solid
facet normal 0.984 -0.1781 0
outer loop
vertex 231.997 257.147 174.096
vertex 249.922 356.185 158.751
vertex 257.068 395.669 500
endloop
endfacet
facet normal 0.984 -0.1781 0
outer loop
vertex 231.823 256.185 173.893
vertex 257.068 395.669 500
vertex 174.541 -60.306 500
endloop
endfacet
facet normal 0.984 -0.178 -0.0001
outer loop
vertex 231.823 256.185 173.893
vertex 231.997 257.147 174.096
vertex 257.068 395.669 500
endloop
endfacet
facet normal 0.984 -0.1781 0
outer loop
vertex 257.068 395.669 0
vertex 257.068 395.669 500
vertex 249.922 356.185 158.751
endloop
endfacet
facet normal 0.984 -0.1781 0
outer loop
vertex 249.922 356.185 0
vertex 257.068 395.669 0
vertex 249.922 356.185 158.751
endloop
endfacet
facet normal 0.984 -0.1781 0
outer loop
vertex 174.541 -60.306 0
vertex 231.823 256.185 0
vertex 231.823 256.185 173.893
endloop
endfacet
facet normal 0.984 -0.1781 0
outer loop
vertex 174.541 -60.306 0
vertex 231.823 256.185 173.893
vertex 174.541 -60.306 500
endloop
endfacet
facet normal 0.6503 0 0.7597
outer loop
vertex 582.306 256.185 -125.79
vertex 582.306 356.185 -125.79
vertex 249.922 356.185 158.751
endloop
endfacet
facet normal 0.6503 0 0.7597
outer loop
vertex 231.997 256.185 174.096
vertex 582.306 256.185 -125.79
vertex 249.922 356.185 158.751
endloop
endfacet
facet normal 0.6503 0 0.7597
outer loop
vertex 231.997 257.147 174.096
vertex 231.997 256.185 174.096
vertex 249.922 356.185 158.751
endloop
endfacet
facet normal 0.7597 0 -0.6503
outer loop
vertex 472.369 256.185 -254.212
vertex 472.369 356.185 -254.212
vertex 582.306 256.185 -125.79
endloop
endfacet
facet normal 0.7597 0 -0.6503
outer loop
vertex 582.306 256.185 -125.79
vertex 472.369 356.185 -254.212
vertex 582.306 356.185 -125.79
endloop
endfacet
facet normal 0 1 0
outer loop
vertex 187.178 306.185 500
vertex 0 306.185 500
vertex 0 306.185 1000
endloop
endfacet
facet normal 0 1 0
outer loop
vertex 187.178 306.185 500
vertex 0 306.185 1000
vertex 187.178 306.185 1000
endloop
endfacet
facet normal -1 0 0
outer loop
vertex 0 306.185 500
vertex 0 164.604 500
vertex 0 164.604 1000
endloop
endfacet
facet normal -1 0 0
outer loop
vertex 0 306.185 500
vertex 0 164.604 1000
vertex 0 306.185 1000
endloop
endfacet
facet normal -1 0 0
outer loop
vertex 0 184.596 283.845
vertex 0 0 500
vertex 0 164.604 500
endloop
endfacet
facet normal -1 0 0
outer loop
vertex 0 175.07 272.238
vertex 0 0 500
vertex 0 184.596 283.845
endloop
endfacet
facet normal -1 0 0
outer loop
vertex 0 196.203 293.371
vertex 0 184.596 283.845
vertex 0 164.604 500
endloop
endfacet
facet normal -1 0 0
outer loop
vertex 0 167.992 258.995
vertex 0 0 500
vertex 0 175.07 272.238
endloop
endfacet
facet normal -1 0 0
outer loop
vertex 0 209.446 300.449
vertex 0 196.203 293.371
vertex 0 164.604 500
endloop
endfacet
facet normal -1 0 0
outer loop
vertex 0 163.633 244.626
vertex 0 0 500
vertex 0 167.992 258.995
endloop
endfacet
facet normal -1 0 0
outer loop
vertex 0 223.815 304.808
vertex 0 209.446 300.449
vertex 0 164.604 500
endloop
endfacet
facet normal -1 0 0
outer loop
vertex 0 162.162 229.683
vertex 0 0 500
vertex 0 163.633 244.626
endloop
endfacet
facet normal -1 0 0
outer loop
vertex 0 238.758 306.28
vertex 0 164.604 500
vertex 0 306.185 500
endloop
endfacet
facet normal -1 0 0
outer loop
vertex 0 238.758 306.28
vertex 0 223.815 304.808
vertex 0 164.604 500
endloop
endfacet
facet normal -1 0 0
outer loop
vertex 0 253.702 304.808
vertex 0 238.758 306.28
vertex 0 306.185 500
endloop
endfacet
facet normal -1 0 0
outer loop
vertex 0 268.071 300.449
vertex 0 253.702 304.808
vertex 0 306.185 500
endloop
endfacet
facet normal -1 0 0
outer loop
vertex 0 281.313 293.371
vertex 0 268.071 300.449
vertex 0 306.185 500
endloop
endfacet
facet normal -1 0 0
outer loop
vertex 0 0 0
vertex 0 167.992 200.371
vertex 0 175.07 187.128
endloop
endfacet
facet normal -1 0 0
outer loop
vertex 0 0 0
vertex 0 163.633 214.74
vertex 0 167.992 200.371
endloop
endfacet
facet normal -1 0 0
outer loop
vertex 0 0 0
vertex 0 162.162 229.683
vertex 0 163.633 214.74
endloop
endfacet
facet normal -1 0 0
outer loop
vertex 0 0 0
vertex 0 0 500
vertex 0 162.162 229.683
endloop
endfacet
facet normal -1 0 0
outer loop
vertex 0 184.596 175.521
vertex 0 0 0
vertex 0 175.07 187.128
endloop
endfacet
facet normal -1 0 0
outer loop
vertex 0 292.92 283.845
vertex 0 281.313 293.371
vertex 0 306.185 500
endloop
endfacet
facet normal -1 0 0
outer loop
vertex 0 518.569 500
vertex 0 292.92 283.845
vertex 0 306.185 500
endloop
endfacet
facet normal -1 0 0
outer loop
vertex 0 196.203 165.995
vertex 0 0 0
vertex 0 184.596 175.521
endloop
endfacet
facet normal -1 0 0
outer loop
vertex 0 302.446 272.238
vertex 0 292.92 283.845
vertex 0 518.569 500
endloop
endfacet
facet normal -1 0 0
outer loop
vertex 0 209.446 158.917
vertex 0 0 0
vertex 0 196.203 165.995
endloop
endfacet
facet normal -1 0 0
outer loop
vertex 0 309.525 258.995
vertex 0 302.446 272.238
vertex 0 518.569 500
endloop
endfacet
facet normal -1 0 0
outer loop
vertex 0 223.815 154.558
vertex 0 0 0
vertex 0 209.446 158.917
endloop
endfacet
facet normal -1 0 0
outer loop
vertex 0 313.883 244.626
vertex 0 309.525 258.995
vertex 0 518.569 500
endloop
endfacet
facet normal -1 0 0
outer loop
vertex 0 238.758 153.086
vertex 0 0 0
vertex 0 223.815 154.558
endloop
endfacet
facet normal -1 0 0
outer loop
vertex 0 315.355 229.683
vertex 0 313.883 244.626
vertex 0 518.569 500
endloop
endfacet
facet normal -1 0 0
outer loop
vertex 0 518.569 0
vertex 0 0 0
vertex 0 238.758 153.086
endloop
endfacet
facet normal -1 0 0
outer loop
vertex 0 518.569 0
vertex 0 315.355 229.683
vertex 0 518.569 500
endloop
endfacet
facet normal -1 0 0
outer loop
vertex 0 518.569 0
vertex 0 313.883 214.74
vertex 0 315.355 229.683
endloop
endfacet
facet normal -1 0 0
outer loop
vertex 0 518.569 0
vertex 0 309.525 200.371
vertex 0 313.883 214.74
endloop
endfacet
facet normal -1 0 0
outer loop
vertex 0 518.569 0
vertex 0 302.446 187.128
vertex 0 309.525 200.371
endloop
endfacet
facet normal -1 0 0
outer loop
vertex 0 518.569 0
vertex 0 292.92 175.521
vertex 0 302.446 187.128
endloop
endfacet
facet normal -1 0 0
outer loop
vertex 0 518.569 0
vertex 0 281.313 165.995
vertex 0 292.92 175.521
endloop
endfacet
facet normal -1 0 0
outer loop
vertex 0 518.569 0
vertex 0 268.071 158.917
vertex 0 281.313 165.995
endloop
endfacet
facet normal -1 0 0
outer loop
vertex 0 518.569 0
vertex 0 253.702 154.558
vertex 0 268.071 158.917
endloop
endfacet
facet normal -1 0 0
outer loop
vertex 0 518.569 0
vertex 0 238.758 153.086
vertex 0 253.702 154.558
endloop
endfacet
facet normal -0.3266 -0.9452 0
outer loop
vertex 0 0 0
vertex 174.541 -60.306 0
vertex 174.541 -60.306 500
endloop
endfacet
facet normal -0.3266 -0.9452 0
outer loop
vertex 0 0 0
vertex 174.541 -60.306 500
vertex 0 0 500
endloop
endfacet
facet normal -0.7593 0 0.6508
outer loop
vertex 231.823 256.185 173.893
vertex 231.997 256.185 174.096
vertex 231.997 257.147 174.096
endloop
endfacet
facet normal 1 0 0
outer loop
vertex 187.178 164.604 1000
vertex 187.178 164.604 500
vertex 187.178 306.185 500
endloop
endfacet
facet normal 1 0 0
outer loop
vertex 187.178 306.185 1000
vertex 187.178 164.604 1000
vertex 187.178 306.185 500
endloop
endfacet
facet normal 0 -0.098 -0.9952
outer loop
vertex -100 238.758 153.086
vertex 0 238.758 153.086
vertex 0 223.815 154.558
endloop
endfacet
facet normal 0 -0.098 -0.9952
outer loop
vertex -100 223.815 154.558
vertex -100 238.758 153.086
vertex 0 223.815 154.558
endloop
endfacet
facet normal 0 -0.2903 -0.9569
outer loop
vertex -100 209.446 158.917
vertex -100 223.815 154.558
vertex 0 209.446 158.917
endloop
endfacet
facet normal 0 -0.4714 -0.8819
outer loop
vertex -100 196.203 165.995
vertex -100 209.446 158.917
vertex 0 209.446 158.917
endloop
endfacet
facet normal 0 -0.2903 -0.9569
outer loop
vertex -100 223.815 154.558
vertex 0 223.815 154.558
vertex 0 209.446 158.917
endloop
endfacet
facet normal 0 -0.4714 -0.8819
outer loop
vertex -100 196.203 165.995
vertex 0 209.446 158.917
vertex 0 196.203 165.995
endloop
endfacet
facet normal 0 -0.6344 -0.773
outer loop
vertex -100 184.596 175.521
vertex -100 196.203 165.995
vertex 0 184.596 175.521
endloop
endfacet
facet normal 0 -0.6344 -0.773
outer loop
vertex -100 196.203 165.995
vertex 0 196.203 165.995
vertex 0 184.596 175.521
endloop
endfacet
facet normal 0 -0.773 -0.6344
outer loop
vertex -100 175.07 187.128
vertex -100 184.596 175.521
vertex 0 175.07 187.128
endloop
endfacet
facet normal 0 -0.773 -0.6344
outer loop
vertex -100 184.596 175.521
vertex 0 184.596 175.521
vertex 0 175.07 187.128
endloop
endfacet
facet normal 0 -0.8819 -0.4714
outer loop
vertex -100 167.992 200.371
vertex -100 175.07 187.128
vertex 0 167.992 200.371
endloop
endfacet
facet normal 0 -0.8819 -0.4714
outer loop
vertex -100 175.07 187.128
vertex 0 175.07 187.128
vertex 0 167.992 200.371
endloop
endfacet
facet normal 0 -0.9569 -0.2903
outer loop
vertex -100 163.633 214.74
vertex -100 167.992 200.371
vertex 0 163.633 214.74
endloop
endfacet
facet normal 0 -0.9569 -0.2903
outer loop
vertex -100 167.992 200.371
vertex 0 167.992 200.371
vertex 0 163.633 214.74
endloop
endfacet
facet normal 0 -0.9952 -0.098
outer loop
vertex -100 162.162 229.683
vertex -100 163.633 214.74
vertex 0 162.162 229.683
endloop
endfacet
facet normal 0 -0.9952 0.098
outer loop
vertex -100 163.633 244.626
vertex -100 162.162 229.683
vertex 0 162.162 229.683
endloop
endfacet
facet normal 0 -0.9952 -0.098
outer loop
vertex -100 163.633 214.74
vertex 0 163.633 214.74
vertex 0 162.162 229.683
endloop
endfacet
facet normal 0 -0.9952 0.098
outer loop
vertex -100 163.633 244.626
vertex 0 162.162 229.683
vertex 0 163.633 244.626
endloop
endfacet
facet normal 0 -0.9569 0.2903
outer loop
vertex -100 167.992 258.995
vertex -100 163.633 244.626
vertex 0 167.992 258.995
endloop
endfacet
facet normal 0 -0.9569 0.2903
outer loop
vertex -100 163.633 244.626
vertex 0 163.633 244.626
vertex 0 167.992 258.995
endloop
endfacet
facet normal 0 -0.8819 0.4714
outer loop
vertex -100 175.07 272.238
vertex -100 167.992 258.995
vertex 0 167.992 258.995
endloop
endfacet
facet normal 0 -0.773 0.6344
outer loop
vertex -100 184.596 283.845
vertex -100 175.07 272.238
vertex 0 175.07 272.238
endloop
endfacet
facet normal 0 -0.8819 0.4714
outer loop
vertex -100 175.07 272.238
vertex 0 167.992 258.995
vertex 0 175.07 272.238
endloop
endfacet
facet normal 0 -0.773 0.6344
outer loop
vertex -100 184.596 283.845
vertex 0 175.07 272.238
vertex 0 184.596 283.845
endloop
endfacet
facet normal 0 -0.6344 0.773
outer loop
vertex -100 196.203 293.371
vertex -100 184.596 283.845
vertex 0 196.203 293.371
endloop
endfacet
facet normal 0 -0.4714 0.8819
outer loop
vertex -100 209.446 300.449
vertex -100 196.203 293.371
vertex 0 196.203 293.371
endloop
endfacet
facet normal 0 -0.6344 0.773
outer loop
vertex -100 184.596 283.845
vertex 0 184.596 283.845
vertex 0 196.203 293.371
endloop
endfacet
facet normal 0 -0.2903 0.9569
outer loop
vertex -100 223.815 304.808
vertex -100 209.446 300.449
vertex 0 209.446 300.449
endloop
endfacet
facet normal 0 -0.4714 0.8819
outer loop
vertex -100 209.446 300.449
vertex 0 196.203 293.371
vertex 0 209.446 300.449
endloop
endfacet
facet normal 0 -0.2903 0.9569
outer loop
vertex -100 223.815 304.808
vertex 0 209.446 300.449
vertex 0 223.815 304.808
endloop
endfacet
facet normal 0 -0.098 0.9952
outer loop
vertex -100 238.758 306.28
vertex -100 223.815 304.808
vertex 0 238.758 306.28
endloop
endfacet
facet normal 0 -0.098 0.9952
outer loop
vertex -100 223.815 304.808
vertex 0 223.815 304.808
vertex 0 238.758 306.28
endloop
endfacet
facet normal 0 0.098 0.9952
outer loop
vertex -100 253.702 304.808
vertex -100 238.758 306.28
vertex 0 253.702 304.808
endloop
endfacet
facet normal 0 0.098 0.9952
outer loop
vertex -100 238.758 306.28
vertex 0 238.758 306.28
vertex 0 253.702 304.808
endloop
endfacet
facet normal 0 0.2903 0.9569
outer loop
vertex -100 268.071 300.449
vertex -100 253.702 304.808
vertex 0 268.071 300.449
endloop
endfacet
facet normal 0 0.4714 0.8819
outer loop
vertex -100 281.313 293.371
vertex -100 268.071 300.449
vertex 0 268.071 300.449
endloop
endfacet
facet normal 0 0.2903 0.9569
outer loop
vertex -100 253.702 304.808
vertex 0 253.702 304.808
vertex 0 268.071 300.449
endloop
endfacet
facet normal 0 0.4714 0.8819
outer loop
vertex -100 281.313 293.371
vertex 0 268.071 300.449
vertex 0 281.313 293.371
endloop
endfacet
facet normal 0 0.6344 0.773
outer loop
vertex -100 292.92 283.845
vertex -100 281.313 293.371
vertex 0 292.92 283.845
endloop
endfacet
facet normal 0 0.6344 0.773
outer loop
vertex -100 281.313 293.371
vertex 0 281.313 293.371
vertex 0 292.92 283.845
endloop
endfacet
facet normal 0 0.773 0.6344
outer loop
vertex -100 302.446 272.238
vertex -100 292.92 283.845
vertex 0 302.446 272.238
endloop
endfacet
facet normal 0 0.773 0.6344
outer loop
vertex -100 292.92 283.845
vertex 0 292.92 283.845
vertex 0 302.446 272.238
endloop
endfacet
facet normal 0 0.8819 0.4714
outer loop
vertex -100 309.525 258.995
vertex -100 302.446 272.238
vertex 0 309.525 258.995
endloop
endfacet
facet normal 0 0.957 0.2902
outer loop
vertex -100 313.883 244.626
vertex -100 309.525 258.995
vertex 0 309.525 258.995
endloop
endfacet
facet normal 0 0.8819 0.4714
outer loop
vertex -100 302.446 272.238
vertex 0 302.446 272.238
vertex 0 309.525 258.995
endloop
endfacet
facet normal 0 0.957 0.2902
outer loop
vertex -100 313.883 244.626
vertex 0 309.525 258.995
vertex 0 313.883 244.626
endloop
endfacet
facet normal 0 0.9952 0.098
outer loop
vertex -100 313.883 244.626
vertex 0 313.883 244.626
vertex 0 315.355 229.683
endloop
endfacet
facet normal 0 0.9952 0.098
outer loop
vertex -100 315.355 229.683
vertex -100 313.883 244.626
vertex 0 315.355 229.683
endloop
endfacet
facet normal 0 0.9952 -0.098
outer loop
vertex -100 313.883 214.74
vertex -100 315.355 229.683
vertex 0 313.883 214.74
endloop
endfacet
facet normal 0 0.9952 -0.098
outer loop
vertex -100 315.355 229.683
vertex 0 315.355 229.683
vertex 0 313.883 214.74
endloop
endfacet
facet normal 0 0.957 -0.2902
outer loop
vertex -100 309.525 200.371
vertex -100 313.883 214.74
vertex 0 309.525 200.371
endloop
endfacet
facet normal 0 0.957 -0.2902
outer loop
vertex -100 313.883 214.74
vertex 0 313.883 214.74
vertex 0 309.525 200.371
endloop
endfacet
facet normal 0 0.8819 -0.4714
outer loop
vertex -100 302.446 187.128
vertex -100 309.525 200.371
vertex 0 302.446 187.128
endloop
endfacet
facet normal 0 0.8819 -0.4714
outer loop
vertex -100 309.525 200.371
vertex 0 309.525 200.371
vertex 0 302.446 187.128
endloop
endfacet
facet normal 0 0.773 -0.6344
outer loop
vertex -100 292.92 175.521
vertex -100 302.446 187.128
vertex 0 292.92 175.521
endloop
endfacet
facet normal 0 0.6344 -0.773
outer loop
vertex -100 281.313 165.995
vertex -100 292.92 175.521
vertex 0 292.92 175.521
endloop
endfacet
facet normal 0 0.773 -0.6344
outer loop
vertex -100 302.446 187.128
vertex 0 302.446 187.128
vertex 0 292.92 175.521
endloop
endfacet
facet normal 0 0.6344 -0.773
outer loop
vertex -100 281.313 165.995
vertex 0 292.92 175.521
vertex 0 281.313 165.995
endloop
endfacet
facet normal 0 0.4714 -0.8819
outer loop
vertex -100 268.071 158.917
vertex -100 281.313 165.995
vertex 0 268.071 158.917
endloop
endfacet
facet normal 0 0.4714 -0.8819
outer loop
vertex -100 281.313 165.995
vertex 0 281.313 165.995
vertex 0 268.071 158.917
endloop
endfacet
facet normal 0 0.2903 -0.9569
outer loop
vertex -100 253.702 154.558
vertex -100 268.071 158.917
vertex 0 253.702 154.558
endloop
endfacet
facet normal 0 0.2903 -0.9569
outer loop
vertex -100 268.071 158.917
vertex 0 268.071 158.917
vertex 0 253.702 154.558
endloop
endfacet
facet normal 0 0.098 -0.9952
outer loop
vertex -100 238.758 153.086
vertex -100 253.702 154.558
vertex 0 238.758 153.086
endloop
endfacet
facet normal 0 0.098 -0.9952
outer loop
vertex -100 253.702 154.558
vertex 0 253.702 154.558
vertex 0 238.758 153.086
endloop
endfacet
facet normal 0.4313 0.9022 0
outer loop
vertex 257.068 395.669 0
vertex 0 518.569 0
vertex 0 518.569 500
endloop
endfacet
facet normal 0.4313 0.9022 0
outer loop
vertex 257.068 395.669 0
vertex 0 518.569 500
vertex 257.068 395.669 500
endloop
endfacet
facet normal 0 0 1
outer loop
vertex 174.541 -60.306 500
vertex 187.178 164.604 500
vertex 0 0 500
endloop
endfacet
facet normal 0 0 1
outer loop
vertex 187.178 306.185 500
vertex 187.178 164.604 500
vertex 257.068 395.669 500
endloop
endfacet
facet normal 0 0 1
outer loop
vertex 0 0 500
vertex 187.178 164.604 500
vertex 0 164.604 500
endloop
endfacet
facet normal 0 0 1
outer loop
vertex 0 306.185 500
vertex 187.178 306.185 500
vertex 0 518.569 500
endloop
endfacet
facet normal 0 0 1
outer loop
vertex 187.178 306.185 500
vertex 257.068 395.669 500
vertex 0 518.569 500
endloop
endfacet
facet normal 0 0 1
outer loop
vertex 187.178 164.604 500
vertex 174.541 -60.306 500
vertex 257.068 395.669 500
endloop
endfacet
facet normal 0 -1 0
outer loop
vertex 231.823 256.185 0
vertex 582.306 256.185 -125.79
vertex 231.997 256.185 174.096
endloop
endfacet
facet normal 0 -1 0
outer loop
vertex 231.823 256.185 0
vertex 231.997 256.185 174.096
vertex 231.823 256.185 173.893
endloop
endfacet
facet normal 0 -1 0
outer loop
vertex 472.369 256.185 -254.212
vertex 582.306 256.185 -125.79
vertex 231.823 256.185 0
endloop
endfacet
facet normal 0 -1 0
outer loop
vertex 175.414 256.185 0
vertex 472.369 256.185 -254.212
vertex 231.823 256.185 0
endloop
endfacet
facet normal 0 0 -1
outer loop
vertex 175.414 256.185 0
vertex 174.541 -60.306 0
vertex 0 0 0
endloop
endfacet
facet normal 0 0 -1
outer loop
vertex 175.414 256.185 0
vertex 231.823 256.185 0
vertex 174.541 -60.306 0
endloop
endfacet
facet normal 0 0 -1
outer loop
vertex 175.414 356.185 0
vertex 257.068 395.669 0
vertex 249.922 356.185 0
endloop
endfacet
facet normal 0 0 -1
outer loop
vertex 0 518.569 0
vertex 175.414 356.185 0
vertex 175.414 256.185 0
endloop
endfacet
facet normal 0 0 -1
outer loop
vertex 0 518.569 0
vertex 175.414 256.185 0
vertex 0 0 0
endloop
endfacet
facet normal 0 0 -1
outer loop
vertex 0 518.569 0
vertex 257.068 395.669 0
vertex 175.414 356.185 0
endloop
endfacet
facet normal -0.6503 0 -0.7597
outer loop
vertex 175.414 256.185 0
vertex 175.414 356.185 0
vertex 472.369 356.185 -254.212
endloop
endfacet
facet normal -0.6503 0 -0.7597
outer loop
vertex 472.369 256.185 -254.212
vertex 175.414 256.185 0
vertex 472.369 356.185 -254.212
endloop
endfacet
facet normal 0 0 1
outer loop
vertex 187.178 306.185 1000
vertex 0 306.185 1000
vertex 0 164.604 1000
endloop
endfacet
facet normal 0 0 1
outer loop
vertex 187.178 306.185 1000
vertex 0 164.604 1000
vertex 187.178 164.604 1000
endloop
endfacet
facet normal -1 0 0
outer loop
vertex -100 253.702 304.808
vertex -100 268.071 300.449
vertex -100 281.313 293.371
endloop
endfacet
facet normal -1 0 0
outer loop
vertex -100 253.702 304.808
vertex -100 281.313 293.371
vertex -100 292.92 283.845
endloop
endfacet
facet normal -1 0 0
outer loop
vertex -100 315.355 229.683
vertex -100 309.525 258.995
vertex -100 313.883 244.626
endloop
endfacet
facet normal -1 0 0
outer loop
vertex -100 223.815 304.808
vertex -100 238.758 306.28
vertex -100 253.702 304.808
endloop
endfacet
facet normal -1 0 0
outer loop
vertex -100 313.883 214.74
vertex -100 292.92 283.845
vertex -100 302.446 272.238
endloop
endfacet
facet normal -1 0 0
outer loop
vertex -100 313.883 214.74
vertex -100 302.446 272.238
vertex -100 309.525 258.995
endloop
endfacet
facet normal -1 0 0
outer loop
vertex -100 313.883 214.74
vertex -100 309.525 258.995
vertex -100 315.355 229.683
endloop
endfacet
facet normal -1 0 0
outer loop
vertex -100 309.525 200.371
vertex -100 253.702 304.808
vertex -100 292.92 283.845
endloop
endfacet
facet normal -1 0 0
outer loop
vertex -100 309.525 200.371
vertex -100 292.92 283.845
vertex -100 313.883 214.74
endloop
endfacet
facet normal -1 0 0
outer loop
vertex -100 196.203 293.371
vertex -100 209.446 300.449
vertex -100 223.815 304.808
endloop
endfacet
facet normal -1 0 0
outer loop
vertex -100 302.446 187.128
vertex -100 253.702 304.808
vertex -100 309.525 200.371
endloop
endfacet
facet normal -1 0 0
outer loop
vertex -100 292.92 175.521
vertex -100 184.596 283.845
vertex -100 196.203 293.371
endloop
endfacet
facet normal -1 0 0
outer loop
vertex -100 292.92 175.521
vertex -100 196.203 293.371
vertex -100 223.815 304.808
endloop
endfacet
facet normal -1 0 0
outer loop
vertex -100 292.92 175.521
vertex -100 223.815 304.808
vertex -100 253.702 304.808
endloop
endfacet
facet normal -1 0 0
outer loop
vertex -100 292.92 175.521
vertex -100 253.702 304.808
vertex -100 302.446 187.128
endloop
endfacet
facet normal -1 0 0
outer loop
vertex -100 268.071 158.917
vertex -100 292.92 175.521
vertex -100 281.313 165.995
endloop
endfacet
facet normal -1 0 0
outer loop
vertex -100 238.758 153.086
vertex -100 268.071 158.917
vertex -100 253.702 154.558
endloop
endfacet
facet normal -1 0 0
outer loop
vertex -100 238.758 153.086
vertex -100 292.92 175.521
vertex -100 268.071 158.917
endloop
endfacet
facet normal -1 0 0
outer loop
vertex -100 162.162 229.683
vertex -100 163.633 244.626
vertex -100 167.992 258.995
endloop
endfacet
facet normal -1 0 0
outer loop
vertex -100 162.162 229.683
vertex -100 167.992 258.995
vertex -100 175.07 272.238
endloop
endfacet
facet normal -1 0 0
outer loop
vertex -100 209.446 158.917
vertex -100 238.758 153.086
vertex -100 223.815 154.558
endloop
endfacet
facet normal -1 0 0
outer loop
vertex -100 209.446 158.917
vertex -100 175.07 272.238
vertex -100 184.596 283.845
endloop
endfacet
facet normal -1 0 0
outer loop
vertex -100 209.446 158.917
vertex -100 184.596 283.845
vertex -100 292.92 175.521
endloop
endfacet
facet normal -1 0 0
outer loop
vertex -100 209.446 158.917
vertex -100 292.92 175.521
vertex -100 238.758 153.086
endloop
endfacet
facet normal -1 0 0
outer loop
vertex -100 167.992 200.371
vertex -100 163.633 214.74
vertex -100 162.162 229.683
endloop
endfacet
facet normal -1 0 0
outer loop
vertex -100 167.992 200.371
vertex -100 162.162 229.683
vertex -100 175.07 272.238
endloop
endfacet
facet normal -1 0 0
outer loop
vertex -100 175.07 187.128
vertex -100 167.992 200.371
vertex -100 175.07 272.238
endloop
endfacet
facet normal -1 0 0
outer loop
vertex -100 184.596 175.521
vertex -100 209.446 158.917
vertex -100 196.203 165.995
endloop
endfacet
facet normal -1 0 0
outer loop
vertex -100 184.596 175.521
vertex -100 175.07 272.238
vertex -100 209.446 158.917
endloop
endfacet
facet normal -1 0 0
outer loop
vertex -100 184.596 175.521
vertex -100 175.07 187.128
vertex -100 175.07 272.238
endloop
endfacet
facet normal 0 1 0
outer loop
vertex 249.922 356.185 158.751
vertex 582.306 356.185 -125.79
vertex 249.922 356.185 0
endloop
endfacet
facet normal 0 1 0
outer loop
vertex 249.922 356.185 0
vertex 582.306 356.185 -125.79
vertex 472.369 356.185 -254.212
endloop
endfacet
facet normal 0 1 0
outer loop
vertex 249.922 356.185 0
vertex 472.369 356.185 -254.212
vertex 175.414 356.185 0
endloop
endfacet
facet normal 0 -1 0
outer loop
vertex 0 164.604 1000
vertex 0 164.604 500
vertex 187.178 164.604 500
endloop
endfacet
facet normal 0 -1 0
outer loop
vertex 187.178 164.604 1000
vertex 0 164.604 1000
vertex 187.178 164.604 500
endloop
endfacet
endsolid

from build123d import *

# Parameters (mm, degrees)
BOSS_EXTRU_1_DEPTH = 500
ESQUISSE2_W        = 187.1782881
ESQUISSE2_H        = 141.58126374
BOSS_EXTRU_2_DEPTH = 500
ESQUISSE3_R        = 76.59677213
BOSS_EXTRU_3_DEPTH = 100
BOSS_EXTRU_4_DEPTH = 50


with BuildPart() as part:
    # Esquisse1 → Boss.-Extru.1 (new body)
    with BuildSketch(Plane.XY):
        Polygon((0, 0), (0, 518.568521206), (257.06807621, 395.669035808), (174.541368625, -60.305866535), align=None)
    extrude(amount=BOSS_EXTRU_1_DEPTH)

    # Esquisse2 → Boss.-Extru.2 (add)
    with BuildSketch(Plane.XY.offset(500)):
        with Locations((93.58914405, 235.39430549)):
            Rectangle(ESQUISSE2_W, ESQUISSE2_H)
    extrude(amount=BOSS_EXTRU_2_DEPTH)

    # Esquisse3 → Boss.-Extru.3 (add)
    with BuildSketch(Plane.ZY):
        with Locations(Location((229.683047697, 238.758360313, 0), (0, 0, 180))):  # turned: the seam where the file's is
            Circle(ESQUISSE3_R)
    extrude(amount=BOSS_EXTRU_3_DEPTH)

    # Esquisse5 → Boss.-Extru.4 (add, symmetric)
    with BuildSketch(Plane(origin=(0, 306.18493736, 0), x_dir=(1, 0, 0), z_dir=(0, 1, 0))):
        Polygon((472.369351722, 254.21152486), (582.306234848, 125.789679085), (231.997079223, -174.096188988), (122.060196097, -45.674343213), align=None)
    extrude(amount=BOSS_EXTRU_4_DEPTH, both=True)


solid = part.part
